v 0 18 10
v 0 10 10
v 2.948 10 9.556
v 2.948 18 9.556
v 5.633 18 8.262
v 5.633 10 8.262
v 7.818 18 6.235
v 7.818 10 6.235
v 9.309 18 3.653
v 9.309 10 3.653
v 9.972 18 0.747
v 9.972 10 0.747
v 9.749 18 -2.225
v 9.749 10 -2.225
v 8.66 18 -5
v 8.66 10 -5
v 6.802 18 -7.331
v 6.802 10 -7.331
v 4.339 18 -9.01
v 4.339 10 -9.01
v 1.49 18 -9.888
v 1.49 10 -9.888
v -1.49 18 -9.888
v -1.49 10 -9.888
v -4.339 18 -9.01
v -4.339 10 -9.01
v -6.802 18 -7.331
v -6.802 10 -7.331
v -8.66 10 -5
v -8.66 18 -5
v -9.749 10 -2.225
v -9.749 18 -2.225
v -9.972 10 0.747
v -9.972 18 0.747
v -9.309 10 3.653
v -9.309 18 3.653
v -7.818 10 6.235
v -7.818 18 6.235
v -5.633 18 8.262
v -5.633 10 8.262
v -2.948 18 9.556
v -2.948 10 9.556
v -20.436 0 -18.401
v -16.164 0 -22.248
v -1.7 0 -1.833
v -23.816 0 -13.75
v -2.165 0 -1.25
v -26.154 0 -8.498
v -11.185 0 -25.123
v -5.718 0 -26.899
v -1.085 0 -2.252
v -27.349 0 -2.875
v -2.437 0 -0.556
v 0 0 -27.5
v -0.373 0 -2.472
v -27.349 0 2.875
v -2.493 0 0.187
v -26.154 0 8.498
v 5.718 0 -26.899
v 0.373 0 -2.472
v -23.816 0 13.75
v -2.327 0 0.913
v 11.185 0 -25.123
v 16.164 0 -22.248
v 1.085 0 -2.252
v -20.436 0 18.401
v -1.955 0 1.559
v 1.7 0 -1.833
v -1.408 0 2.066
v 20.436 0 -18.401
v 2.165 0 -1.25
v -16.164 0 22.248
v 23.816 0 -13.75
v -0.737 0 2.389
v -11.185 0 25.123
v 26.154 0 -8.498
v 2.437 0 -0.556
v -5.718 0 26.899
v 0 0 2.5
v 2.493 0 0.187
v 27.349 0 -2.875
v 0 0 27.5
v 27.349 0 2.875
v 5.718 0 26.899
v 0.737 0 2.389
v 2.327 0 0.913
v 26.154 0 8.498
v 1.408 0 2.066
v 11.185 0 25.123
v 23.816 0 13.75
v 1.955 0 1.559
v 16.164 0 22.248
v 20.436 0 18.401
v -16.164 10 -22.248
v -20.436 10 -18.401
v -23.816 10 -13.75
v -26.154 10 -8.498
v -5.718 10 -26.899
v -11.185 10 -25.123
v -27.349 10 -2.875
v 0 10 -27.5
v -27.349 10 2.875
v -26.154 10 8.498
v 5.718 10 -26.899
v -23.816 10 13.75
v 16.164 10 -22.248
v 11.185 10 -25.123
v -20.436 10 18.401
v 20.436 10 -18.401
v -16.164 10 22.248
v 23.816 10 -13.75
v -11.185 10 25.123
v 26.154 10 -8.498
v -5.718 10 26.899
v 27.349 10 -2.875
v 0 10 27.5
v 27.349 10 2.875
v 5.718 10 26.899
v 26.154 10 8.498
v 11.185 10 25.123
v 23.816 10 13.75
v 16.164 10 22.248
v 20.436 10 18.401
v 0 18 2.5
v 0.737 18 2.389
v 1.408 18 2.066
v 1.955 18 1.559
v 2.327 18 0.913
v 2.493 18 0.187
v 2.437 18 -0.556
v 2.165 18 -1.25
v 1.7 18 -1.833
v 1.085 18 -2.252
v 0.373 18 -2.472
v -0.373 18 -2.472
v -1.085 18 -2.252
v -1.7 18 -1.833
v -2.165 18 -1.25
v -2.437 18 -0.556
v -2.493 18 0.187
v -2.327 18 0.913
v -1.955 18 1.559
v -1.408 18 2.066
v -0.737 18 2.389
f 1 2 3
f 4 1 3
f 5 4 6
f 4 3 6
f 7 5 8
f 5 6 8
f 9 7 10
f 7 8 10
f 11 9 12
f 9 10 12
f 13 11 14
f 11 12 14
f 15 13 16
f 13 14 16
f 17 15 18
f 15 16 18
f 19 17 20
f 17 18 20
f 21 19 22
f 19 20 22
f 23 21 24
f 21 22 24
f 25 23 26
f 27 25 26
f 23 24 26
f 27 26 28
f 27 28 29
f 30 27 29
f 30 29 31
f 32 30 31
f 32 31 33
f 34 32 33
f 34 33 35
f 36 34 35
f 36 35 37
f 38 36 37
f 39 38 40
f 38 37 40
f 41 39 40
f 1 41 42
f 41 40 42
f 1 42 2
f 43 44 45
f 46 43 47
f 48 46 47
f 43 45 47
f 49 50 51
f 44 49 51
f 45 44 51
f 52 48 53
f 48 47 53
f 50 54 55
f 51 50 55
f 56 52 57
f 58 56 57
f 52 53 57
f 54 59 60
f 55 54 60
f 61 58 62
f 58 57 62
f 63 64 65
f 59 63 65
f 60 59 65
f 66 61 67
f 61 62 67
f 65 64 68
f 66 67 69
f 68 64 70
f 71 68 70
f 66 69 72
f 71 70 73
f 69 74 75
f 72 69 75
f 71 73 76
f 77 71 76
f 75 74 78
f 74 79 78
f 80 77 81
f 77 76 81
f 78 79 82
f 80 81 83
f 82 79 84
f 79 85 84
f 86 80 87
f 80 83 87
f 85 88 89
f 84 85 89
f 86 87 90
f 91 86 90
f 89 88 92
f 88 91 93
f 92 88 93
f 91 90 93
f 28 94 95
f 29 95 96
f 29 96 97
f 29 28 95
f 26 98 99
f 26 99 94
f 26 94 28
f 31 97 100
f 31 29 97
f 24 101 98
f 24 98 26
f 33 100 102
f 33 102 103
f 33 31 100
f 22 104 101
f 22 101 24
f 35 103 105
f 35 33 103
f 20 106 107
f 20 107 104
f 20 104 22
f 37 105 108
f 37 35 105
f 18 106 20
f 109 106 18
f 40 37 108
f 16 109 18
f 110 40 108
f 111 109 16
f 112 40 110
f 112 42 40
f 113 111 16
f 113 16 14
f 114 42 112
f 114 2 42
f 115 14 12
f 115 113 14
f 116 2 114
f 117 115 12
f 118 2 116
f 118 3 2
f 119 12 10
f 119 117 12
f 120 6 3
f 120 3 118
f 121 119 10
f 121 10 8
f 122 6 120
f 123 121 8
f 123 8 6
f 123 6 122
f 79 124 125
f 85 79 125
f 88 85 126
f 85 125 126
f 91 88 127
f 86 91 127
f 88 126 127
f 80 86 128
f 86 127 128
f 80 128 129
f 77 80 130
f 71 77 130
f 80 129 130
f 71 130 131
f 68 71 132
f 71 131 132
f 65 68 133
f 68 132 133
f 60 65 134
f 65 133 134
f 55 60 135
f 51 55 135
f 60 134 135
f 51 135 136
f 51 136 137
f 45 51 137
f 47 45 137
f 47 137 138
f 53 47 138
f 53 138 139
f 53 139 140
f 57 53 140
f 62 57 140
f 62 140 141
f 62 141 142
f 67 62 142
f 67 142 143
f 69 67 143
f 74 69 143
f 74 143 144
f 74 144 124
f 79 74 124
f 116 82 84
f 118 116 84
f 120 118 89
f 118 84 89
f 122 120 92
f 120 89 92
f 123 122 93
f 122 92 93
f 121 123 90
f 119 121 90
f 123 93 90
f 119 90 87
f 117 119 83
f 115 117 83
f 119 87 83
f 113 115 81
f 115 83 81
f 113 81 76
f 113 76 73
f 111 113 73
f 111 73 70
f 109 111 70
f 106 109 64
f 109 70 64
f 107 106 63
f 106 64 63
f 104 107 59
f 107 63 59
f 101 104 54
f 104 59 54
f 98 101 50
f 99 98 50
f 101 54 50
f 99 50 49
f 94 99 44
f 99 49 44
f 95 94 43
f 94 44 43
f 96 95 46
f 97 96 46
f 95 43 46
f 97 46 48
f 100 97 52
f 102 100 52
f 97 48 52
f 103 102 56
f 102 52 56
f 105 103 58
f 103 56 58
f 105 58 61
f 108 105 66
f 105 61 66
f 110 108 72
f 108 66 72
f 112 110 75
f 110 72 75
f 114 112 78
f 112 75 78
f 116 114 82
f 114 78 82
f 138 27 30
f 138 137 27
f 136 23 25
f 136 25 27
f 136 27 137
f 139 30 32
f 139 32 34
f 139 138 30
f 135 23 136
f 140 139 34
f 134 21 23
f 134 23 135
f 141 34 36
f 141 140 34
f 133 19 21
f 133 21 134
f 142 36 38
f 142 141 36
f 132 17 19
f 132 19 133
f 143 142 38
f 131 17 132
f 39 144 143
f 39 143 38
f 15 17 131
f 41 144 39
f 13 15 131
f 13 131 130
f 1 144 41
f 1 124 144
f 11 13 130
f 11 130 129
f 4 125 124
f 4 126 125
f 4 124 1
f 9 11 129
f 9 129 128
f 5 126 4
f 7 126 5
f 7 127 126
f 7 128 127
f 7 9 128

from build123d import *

# Parameters (mm, degrees)
CROQUIS1_R              = 27.5
SALIENTE_EXTRUIR1_DEPTH = 10
CROQUIS2_R              = 10
SALIENTE_EXTRUIR2_DEPTH = 8
CORTAR_EXTRUIR1_REACH   = 44.854
CROQUIS3_R              = 2.5


with BuildPart() as part:
    # Croquis1 → Saliente-Extruir1 (new body)
    with BuildSketch(Plane(origin=(0, 0, 0), x_dir=(1, 0, 0), z_dir=(0, 1, 0))):
        with Locations(Location((0, 0, 0), (0, 0, 270))):
            Circle(CROQUIS1_R)
    extrude(amount=SALIENTE_EXTRUIR1_DEPTH)

    # Croquis2 → Saliente-Extruir2 (add)
    with BuildSketch(Plane(origin=(0, 10, 0), x_dir=(1, 0, 0), z_dir=(0, 1, 0))):
        with Locations(Location((0, 0, 0), (0, 0, 270))):
            Circle(CROQUIS2_R)
    extrude(amount=SALIENTE_EXTRUIR2_DEPTH)

    # Croquis3 → Cortar-Extruir1 (cut, up to next)
    with BuildSketch(Plane(origin=(0, 18, 0), x_dir=(1, 0, 0), z_dir=(0, 1, 0)), mode=Mode.PRIVATE) as cortar_extruir1_sk1:
        with Locations(Location((0, 0, 0), (0, 0, 270))):
            Circle(CROQUIS3_R)
    cortar_extruir1_tool1 = extrude(cortar_extruir1_sk1.sketch, amount=-CORTAR_EXTRUIR1_REACH, mode=Mode.PRIVATE) & part.part
    add(cortar_extruir1_tool1.solids().sort_by_distance((0, 18, 0))[0], mode=Mode.SUBTRACT)


solid = part.part
